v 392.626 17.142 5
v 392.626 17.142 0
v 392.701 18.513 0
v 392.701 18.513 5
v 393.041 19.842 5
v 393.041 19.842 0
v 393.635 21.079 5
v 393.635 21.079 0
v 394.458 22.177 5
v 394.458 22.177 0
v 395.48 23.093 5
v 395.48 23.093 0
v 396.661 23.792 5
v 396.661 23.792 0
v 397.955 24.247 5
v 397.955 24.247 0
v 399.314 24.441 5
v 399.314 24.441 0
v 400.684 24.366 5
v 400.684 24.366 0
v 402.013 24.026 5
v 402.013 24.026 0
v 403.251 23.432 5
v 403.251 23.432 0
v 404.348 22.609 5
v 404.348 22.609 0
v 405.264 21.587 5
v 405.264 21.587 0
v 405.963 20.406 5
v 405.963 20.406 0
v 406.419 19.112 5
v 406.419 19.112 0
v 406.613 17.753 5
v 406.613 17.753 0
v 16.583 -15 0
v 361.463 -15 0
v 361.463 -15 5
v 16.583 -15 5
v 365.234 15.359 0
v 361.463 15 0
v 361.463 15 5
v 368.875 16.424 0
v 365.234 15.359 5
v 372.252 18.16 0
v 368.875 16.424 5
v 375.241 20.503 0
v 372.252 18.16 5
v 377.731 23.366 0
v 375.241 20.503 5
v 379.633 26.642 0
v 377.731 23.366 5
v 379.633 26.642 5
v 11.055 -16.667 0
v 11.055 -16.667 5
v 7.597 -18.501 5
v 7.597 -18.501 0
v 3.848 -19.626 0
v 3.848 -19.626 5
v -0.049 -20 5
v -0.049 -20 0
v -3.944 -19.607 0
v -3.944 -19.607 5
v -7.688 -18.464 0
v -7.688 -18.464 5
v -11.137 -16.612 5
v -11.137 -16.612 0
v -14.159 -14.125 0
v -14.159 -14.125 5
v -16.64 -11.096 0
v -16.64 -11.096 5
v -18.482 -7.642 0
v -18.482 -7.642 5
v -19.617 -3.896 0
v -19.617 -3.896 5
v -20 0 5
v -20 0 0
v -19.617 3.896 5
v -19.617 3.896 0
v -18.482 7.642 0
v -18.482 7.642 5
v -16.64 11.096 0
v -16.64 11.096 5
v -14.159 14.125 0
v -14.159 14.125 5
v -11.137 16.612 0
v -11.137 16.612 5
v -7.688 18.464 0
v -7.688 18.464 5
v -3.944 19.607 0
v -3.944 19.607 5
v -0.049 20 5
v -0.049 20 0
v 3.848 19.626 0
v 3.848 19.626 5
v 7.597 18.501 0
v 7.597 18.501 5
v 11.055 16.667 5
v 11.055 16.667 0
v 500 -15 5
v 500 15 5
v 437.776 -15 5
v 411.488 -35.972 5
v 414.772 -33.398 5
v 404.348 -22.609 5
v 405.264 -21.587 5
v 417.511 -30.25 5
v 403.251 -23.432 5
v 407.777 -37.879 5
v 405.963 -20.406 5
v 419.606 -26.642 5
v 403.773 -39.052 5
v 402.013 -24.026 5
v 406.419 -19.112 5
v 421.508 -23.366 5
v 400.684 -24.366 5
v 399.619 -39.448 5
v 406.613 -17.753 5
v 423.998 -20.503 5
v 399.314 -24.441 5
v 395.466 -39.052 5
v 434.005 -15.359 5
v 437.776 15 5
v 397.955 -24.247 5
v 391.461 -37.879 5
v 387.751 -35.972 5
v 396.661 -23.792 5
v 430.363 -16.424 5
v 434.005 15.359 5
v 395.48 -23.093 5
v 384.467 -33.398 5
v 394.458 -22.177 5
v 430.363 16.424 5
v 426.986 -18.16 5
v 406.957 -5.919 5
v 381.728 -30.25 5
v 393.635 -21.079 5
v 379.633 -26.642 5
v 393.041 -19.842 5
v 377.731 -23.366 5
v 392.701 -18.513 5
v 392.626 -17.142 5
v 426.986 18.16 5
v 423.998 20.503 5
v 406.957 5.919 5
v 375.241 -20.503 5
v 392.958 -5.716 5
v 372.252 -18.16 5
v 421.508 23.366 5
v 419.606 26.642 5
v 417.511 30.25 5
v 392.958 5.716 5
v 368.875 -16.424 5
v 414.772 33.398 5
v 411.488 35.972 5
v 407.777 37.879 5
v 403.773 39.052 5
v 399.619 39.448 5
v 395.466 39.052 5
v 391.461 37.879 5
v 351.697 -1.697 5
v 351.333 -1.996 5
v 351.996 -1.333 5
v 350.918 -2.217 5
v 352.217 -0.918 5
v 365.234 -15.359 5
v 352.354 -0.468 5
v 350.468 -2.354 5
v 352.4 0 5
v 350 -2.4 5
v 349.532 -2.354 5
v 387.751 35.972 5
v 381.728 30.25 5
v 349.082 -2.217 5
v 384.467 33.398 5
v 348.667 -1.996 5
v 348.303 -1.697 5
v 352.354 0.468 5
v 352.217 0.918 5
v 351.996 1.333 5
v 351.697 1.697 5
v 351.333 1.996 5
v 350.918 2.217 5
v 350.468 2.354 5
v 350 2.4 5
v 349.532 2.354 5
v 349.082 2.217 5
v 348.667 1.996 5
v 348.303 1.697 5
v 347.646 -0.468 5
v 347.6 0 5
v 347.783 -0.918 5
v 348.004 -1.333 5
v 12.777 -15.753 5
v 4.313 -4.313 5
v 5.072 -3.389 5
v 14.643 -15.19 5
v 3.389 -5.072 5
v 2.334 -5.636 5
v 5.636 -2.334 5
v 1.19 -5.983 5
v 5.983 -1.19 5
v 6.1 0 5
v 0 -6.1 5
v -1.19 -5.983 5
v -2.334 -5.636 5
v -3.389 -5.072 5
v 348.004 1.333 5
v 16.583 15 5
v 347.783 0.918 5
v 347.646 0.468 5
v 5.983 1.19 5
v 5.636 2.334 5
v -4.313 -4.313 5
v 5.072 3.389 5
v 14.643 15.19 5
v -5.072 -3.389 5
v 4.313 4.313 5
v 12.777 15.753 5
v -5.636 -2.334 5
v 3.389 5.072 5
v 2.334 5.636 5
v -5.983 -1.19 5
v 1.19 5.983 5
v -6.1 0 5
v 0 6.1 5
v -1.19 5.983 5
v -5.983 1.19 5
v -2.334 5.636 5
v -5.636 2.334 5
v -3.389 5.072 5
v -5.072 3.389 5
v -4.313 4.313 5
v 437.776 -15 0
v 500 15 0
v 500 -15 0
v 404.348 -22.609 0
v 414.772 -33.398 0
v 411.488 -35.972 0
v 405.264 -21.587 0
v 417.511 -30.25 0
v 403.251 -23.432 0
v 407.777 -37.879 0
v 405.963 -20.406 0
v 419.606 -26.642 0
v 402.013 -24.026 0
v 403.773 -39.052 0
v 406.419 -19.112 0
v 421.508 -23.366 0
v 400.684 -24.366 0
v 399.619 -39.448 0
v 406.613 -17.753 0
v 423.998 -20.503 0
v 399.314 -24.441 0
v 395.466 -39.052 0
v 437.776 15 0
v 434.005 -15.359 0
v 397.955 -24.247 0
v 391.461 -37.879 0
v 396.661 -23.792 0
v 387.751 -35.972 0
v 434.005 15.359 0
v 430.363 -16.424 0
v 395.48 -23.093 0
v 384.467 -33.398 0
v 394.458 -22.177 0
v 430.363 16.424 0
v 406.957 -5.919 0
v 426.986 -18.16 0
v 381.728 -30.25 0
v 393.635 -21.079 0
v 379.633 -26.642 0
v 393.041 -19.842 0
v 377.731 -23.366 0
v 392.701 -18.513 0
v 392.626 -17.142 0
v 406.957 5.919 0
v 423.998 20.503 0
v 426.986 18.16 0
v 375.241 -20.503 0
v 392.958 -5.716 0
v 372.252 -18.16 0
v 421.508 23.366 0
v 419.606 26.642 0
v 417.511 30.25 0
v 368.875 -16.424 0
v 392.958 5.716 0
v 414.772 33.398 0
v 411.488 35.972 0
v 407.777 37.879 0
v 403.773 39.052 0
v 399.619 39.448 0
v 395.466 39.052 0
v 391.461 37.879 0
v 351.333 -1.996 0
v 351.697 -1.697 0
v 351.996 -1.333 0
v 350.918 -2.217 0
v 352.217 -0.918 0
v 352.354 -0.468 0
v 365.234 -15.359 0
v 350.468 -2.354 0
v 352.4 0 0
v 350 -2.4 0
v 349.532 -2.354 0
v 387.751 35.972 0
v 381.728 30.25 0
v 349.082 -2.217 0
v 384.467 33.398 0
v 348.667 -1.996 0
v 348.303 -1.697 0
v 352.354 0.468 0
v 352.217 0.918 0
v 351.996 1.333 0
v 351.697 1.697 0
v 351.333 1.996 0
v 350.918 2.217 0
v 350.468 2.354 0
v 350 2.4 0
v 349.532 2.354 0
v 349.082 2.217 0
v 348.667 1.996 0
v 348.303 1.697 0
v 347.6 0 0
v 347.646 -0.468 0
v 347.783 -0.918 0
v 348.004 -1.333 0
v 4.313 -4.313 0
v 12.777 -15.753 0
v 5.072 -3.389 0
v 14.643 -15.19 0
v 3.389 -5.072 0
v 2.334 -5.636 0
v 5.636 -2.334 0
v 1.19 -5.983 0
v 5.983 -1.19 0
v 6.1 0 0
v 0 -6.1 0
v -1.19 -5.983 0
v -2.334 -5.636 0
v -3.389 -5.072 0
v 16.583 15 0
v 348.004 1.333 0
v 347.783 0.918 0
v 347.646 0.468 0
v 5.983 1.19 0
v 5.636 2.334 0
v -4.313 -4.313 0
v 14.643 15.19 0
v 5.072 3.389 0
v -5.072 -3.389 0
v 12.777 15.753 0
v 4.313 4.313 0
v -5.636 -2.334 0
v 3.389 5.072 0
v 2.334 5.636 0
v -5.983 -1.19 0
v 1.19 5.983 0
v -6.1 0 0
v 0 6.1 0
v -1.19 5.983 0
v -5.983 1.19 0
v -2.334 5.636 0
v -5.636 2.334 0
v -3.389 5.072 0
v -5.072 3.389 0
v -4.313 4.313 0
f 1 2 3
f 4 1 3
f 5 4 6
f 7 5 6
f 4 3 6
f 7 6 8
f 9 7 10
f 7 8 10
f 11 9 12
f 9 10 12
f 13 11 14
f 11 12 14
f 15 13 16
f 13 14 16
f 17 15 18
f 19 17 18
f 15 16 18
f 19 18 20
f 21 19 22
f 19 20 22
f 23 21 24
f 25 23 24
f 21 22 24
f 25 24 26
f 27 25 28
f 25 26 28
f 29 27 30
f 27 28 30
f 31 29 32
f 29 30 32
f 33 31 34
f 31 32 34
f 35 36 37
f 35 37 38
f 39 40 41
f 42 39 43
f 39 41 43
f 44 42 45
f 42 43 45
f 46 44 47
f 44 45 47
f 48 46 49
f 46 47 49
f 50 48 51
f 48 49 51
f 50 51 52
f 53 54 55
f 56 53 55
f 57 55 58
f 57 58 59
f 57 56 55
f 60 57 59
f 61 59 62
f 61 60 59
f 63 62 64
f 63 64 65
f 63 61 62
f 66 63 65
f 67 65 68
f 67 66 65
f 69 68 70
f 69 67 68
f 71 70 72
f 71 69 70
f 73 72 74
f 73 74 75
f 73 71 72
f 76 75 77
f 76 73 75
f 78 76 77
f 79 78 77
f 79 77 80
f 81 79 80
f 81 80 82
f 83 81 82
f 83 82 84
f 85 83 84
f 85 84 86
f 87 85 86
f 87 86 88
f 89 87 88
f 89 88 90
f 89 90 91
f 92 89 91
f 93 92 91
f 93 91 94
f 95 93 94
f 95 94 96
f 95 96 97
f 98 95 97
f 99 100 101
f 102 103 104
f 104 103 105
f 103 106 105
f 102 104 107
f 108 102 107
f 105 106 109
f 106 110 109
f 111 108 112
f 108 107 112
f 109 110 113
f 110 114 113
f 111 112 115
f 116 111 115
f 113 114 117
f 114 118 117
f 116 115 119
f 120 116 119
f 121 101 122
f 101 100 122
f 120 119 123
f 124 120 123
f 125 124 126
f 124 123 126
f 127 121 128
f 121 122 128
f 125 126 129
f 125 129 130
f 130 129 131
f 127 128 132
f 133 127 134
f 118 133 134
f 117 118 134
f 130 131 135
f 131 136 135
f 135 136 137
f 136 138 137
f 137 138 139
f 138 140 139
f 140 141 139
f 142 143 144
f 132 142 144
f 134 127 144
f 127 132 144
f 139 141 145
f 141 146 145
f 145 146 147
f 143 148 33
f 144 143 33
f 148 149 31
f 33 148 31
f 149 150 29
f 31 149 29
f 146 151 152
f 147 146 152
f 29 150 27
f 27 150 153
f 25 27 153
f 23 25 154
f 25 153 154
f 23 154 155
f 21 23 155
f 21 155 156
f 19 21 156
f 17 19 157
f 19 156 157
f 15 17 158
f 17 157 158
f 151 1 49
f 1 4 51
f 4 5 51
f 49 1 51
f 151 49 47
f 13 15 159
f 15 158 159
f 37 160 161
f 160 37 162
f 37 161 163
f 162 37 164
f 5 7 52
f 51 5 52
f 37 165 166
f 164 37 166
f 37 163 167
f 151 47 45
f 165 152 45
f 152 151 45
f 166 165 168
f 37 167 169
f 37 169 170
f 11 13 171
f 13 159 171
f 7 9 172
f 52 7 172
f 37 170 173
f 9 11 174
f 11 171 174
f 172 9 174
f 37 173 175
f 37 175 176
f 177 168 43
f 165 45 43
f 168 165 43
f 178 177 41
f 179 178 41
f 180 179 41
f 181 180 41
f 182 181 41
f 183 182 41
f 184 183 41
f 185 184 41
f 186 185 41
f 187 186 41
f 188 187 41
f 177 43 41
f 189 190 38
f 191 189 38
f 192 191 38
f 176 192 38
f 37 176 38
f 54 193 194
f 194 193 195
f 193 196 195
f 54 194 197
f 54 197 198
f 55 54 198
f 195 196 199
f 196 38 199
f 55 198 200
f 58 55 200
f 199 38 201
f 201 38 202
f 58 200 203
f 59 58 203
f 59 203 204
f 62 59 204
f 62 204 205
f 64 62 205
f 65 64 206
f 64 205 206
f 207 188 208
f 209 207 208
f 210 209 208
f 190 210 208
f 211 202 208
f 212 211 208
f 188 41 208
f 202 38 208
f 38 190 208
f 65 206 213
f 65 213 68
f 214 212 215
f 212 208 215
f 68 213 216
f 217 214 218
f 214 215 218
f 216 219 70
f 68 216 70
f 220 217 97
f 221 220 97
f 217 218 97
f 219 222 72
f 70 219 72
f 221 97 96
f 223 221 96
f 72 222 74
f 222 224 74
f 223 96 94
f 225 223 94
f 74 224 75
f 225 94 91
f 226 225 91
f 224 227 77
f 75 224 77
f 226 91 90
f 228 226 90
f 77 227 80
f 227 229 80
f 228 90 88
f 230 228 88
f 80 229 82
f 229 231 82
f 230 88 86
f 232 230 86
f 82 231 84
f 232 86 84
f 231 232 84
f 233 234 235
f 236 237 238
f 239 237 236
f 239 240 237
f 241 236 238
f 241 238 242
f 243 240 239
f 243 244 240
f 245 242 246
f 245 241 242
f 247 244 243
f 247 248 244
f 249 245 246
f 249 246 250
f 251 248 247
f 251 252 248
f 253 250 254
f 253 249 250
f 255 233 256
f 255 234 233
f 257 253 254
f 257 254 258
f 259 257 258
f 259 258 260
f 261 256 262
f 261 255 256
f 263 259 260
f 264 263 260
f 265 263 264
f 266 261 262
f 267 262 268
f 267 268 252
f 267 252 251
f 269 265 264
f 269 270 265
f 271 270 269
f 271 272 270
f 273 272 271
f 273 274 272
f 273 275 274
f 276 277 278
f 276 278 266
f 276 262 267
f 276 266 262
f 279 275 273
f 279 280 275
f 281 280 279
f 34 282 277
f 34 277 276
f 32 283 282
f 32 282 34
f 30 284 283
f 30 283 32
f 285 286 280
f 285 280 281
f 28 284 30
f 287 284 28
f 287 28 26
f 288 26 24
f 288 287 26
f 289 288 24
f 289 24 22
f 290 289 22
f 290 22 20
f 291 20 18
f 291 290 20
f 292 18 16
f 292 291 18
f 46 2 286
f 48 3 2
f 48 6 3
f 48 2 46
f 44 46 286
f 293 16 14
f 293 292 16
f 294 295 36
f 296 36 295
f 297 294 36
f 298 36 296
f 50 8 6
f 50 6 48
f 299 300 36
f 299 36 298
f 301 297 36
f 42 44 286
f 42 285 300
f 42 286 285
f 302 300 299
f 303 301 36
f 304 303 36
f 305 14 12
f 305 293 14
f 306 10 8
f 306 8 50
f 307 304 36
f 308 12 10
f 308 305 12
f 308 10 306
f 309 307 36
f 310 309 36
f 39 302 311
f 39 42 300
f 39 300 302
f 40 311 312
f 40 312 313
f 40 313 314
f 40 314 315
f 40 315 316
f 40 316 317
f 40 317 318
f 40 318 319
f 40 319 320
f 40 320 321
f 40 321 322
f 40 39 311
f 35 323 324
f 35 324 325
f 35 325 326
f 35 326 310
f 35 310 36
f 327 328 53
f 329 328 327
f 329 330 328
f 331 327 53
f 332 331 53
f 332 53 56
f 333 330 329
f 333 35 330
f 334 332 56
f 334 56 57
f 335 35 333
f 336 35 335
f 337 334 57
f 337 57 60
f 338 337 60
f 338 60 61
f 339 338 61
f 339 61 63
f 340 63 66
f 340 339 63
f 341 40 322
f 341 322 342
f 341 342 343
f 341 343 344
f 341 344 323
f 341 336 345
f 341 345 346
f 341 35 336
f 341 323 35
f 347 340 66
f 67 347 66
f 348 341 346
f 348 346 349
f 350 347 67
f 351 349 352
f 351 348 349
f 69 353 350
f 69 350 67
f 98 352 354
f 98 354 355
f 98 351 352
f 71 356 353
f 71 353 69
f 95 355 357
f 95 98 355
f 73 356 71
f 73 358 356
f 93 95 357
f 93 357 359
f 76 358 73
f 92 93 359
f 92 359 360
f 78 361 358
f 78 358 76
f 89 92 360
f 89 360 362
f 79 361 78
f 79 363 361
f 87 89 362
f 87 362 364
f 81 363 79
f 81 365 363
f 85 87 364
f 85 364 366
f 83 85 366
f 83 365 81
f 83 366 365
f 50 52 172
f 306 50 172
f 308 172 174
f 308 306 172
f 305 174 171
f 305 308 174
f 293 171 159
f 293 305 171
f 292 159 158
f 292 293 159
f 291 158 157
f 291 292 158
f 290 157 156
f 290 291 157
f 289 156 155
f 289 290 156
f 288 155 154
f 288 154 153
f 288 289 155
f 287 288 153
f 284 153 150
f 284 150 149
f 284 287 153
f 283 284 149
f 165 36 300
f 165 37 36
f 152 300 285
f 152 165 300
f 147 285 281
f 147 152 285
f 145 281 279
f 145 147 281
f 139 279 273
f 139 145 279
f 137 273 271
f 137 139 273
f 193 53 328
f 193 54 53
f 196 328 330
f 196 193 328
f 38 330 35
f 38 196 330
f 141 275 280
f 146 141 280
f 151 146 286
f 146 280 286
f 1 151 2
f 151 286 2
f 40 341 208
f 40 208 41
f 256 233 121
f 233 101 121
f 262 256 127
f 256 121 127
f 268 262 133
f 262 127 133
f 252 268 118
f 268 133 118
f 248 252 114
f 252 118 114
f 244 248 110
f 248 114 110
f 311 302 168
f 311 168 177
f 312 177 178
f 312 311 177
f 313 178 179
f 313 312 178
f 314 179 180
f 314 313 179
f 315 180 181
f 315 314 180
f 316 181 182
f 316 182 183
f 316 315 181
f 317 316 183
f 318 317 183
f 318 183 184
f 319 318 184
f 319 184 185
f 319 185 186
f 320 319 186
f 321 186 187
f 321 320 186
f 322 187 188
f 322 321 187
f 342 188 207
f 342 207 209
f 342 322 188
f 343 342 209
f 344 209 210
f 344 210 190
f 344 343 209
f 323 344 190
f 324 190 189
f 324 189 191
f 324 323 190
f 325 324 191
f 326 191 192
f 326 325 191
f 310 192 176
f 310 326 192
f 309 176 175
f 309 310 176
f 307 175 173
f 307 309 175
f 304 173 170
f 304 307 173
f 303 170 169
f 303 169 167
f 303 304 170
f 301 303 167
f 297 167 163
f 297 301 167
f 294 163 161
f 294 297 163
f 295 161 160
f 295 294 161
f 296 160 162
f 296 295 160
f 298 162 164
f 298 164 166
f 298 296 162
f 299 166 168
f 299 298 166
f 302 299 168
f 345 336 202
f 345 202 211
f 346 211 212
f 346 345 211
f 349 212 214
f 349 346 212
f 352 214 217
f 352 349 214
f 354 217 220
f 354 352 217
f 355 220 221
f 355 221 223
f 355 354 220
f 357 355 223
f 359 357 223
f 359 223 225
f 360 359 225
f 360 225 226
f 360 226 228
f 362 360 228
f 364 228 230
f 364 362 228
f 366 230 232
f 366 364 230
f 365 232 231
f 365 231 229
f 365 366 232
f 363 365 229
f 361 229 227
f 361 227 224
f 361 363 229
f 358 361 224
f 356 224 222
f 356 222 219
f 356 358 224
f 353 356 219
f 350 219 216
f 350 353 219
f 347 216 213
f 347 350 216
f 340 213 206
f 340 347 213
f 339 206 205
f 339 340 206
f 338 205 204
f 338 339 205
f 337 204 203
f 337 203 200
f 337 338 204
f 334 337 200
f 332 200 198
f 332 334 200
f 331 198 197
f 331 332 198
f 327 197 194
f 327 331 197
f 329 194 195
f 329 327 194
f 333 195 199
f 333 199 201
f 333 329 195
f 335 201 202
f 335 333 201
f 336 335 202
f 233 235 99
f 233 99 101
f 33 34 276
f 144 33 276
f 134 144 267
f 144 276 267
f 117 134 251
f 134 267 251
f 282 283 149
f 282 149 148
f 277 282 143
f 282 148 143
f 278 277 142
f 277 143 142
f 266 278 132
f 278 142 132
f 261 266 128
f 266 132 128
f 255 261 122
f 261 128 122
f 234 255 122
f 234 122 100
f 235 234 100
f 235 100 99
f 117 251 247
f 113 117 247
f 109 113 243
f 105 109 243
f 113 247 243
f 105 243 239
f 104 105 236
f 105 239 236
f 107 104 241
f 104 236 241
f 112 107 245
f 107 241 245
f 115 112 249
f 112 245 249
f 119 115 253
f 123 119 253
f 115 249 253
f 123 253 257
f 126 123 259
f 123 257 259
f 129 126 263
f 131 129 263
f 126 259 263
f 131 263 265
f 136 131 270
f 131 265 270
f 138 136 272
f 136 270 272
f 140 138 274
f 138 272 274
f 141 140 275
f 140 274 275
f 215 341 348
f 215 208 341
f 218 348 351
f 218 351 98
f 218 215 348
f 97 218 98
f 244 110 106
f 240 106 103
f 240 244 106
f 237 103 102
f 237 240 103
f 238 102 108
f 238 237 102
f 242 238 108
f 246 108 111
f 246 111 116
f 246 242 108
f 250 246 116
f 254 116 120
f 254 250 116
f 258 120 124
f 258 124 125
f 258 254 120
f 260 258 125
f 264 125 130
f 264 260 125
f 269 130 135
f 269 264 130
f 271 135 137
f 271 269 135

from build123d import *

# Parameters (mm, degrees)
ESQUISSE1_R        = 6.1
ESQUISSE1_R_2      = 2.4
BOSS_EXTRU_1_DEPTH = 5
CONG_1_R           = 10
CONG_2_R           = 20


with BuildPart() as part:
    # Esquisse1 → Boss.-Extru.1 (new body)
    with BuildSketch(Plane.XY):
        with BuildLine():
            Line((13.228756555, 15), (377.702263695, 15))
            ThreePointArc((377.702263695, 15), (377.67197868, 15.744094767), (377.640227758, 16.488128424))
            ThreePointArc((377.640227758, 16.488128424), (398.659662111, 39.426815821), (421.598349508, 18.407381468))
            ThreePointArc((421.598349508, 18.407381468), (421.669280552, 16.703827075), (421.733328064, 15))
            Line((421.733328064, 15), (500, 15))
            Line((500, 15), (500, -15))
            Line((500, -15), (421.733328064, -15))
            ThreePointArc((421.733328064, -15), (421.669280552, -16.703827075), (421.598349508, -18.407381468))
            ThreePointArc((421.598349508, -18.407381468), (398.659662111, -39.426815821), (377.640227758, -16.488128424))
            ThreePointArc((377.640227758, -16.488128424), (377.67197868, -15.744094767), (377.702263695, -15))
            Line((377.702263695, -15), (13.228756555, -15))
            ThreePointArc((13.228756555, -15), (-20, 0), (13.228756555, 15))
        make_face()
        Circle(ESQUISSE1_R, mode=Mode.SUBTRACT)
        with Locations((350, 0)):
            Circle(ESQUISSE1_R_2, mode=Mode.SUBTRACT)
        with BuildLine():
            ThreePointArc((392.625951082, -17.142419235), (393, 0), (392.625951082, 17.142419235))
            ThreePointArc((392.625951082, 17.142419235), (399.313952921, 24.441092497), (406.612626184, 17.753090658))
            ThreePointArc((406.612626184, 17.753090658), (407, 0), (406.612626184, -17.753090658))
            ThreePointArc((406.612626184, -17.753090658), (399.313952921, -24.441092497), (392.625951082, -17.142419235))
        make_face(mode=Mode.SUBTRACT)
    extrude(amount=BOSS_EXTRU_1_DEPTH)

    # Congé1
    cong_1_edges = [part.edges().sort_by_distance(p)[0] for p in [
        (13.228756555, 15, 2.5),
        (13.228756555, -15, 2.5),
    ]]
    fillet(cong_1_edges, radius=CONG_1_R)

    # Congé2
    cong_2_edges = [part.edges().sort_by_distance(p)[0] for p in [
        (421.733328064, 15, 2.5),
        (421.733328064, -15, 2.5),
        (377.702263695, 15, 2.5),
        (377.702263695, -15, 2.5),
    ]]
    fillet(cong_2_edges, radius=CONG_2_R)


solid = part.part
